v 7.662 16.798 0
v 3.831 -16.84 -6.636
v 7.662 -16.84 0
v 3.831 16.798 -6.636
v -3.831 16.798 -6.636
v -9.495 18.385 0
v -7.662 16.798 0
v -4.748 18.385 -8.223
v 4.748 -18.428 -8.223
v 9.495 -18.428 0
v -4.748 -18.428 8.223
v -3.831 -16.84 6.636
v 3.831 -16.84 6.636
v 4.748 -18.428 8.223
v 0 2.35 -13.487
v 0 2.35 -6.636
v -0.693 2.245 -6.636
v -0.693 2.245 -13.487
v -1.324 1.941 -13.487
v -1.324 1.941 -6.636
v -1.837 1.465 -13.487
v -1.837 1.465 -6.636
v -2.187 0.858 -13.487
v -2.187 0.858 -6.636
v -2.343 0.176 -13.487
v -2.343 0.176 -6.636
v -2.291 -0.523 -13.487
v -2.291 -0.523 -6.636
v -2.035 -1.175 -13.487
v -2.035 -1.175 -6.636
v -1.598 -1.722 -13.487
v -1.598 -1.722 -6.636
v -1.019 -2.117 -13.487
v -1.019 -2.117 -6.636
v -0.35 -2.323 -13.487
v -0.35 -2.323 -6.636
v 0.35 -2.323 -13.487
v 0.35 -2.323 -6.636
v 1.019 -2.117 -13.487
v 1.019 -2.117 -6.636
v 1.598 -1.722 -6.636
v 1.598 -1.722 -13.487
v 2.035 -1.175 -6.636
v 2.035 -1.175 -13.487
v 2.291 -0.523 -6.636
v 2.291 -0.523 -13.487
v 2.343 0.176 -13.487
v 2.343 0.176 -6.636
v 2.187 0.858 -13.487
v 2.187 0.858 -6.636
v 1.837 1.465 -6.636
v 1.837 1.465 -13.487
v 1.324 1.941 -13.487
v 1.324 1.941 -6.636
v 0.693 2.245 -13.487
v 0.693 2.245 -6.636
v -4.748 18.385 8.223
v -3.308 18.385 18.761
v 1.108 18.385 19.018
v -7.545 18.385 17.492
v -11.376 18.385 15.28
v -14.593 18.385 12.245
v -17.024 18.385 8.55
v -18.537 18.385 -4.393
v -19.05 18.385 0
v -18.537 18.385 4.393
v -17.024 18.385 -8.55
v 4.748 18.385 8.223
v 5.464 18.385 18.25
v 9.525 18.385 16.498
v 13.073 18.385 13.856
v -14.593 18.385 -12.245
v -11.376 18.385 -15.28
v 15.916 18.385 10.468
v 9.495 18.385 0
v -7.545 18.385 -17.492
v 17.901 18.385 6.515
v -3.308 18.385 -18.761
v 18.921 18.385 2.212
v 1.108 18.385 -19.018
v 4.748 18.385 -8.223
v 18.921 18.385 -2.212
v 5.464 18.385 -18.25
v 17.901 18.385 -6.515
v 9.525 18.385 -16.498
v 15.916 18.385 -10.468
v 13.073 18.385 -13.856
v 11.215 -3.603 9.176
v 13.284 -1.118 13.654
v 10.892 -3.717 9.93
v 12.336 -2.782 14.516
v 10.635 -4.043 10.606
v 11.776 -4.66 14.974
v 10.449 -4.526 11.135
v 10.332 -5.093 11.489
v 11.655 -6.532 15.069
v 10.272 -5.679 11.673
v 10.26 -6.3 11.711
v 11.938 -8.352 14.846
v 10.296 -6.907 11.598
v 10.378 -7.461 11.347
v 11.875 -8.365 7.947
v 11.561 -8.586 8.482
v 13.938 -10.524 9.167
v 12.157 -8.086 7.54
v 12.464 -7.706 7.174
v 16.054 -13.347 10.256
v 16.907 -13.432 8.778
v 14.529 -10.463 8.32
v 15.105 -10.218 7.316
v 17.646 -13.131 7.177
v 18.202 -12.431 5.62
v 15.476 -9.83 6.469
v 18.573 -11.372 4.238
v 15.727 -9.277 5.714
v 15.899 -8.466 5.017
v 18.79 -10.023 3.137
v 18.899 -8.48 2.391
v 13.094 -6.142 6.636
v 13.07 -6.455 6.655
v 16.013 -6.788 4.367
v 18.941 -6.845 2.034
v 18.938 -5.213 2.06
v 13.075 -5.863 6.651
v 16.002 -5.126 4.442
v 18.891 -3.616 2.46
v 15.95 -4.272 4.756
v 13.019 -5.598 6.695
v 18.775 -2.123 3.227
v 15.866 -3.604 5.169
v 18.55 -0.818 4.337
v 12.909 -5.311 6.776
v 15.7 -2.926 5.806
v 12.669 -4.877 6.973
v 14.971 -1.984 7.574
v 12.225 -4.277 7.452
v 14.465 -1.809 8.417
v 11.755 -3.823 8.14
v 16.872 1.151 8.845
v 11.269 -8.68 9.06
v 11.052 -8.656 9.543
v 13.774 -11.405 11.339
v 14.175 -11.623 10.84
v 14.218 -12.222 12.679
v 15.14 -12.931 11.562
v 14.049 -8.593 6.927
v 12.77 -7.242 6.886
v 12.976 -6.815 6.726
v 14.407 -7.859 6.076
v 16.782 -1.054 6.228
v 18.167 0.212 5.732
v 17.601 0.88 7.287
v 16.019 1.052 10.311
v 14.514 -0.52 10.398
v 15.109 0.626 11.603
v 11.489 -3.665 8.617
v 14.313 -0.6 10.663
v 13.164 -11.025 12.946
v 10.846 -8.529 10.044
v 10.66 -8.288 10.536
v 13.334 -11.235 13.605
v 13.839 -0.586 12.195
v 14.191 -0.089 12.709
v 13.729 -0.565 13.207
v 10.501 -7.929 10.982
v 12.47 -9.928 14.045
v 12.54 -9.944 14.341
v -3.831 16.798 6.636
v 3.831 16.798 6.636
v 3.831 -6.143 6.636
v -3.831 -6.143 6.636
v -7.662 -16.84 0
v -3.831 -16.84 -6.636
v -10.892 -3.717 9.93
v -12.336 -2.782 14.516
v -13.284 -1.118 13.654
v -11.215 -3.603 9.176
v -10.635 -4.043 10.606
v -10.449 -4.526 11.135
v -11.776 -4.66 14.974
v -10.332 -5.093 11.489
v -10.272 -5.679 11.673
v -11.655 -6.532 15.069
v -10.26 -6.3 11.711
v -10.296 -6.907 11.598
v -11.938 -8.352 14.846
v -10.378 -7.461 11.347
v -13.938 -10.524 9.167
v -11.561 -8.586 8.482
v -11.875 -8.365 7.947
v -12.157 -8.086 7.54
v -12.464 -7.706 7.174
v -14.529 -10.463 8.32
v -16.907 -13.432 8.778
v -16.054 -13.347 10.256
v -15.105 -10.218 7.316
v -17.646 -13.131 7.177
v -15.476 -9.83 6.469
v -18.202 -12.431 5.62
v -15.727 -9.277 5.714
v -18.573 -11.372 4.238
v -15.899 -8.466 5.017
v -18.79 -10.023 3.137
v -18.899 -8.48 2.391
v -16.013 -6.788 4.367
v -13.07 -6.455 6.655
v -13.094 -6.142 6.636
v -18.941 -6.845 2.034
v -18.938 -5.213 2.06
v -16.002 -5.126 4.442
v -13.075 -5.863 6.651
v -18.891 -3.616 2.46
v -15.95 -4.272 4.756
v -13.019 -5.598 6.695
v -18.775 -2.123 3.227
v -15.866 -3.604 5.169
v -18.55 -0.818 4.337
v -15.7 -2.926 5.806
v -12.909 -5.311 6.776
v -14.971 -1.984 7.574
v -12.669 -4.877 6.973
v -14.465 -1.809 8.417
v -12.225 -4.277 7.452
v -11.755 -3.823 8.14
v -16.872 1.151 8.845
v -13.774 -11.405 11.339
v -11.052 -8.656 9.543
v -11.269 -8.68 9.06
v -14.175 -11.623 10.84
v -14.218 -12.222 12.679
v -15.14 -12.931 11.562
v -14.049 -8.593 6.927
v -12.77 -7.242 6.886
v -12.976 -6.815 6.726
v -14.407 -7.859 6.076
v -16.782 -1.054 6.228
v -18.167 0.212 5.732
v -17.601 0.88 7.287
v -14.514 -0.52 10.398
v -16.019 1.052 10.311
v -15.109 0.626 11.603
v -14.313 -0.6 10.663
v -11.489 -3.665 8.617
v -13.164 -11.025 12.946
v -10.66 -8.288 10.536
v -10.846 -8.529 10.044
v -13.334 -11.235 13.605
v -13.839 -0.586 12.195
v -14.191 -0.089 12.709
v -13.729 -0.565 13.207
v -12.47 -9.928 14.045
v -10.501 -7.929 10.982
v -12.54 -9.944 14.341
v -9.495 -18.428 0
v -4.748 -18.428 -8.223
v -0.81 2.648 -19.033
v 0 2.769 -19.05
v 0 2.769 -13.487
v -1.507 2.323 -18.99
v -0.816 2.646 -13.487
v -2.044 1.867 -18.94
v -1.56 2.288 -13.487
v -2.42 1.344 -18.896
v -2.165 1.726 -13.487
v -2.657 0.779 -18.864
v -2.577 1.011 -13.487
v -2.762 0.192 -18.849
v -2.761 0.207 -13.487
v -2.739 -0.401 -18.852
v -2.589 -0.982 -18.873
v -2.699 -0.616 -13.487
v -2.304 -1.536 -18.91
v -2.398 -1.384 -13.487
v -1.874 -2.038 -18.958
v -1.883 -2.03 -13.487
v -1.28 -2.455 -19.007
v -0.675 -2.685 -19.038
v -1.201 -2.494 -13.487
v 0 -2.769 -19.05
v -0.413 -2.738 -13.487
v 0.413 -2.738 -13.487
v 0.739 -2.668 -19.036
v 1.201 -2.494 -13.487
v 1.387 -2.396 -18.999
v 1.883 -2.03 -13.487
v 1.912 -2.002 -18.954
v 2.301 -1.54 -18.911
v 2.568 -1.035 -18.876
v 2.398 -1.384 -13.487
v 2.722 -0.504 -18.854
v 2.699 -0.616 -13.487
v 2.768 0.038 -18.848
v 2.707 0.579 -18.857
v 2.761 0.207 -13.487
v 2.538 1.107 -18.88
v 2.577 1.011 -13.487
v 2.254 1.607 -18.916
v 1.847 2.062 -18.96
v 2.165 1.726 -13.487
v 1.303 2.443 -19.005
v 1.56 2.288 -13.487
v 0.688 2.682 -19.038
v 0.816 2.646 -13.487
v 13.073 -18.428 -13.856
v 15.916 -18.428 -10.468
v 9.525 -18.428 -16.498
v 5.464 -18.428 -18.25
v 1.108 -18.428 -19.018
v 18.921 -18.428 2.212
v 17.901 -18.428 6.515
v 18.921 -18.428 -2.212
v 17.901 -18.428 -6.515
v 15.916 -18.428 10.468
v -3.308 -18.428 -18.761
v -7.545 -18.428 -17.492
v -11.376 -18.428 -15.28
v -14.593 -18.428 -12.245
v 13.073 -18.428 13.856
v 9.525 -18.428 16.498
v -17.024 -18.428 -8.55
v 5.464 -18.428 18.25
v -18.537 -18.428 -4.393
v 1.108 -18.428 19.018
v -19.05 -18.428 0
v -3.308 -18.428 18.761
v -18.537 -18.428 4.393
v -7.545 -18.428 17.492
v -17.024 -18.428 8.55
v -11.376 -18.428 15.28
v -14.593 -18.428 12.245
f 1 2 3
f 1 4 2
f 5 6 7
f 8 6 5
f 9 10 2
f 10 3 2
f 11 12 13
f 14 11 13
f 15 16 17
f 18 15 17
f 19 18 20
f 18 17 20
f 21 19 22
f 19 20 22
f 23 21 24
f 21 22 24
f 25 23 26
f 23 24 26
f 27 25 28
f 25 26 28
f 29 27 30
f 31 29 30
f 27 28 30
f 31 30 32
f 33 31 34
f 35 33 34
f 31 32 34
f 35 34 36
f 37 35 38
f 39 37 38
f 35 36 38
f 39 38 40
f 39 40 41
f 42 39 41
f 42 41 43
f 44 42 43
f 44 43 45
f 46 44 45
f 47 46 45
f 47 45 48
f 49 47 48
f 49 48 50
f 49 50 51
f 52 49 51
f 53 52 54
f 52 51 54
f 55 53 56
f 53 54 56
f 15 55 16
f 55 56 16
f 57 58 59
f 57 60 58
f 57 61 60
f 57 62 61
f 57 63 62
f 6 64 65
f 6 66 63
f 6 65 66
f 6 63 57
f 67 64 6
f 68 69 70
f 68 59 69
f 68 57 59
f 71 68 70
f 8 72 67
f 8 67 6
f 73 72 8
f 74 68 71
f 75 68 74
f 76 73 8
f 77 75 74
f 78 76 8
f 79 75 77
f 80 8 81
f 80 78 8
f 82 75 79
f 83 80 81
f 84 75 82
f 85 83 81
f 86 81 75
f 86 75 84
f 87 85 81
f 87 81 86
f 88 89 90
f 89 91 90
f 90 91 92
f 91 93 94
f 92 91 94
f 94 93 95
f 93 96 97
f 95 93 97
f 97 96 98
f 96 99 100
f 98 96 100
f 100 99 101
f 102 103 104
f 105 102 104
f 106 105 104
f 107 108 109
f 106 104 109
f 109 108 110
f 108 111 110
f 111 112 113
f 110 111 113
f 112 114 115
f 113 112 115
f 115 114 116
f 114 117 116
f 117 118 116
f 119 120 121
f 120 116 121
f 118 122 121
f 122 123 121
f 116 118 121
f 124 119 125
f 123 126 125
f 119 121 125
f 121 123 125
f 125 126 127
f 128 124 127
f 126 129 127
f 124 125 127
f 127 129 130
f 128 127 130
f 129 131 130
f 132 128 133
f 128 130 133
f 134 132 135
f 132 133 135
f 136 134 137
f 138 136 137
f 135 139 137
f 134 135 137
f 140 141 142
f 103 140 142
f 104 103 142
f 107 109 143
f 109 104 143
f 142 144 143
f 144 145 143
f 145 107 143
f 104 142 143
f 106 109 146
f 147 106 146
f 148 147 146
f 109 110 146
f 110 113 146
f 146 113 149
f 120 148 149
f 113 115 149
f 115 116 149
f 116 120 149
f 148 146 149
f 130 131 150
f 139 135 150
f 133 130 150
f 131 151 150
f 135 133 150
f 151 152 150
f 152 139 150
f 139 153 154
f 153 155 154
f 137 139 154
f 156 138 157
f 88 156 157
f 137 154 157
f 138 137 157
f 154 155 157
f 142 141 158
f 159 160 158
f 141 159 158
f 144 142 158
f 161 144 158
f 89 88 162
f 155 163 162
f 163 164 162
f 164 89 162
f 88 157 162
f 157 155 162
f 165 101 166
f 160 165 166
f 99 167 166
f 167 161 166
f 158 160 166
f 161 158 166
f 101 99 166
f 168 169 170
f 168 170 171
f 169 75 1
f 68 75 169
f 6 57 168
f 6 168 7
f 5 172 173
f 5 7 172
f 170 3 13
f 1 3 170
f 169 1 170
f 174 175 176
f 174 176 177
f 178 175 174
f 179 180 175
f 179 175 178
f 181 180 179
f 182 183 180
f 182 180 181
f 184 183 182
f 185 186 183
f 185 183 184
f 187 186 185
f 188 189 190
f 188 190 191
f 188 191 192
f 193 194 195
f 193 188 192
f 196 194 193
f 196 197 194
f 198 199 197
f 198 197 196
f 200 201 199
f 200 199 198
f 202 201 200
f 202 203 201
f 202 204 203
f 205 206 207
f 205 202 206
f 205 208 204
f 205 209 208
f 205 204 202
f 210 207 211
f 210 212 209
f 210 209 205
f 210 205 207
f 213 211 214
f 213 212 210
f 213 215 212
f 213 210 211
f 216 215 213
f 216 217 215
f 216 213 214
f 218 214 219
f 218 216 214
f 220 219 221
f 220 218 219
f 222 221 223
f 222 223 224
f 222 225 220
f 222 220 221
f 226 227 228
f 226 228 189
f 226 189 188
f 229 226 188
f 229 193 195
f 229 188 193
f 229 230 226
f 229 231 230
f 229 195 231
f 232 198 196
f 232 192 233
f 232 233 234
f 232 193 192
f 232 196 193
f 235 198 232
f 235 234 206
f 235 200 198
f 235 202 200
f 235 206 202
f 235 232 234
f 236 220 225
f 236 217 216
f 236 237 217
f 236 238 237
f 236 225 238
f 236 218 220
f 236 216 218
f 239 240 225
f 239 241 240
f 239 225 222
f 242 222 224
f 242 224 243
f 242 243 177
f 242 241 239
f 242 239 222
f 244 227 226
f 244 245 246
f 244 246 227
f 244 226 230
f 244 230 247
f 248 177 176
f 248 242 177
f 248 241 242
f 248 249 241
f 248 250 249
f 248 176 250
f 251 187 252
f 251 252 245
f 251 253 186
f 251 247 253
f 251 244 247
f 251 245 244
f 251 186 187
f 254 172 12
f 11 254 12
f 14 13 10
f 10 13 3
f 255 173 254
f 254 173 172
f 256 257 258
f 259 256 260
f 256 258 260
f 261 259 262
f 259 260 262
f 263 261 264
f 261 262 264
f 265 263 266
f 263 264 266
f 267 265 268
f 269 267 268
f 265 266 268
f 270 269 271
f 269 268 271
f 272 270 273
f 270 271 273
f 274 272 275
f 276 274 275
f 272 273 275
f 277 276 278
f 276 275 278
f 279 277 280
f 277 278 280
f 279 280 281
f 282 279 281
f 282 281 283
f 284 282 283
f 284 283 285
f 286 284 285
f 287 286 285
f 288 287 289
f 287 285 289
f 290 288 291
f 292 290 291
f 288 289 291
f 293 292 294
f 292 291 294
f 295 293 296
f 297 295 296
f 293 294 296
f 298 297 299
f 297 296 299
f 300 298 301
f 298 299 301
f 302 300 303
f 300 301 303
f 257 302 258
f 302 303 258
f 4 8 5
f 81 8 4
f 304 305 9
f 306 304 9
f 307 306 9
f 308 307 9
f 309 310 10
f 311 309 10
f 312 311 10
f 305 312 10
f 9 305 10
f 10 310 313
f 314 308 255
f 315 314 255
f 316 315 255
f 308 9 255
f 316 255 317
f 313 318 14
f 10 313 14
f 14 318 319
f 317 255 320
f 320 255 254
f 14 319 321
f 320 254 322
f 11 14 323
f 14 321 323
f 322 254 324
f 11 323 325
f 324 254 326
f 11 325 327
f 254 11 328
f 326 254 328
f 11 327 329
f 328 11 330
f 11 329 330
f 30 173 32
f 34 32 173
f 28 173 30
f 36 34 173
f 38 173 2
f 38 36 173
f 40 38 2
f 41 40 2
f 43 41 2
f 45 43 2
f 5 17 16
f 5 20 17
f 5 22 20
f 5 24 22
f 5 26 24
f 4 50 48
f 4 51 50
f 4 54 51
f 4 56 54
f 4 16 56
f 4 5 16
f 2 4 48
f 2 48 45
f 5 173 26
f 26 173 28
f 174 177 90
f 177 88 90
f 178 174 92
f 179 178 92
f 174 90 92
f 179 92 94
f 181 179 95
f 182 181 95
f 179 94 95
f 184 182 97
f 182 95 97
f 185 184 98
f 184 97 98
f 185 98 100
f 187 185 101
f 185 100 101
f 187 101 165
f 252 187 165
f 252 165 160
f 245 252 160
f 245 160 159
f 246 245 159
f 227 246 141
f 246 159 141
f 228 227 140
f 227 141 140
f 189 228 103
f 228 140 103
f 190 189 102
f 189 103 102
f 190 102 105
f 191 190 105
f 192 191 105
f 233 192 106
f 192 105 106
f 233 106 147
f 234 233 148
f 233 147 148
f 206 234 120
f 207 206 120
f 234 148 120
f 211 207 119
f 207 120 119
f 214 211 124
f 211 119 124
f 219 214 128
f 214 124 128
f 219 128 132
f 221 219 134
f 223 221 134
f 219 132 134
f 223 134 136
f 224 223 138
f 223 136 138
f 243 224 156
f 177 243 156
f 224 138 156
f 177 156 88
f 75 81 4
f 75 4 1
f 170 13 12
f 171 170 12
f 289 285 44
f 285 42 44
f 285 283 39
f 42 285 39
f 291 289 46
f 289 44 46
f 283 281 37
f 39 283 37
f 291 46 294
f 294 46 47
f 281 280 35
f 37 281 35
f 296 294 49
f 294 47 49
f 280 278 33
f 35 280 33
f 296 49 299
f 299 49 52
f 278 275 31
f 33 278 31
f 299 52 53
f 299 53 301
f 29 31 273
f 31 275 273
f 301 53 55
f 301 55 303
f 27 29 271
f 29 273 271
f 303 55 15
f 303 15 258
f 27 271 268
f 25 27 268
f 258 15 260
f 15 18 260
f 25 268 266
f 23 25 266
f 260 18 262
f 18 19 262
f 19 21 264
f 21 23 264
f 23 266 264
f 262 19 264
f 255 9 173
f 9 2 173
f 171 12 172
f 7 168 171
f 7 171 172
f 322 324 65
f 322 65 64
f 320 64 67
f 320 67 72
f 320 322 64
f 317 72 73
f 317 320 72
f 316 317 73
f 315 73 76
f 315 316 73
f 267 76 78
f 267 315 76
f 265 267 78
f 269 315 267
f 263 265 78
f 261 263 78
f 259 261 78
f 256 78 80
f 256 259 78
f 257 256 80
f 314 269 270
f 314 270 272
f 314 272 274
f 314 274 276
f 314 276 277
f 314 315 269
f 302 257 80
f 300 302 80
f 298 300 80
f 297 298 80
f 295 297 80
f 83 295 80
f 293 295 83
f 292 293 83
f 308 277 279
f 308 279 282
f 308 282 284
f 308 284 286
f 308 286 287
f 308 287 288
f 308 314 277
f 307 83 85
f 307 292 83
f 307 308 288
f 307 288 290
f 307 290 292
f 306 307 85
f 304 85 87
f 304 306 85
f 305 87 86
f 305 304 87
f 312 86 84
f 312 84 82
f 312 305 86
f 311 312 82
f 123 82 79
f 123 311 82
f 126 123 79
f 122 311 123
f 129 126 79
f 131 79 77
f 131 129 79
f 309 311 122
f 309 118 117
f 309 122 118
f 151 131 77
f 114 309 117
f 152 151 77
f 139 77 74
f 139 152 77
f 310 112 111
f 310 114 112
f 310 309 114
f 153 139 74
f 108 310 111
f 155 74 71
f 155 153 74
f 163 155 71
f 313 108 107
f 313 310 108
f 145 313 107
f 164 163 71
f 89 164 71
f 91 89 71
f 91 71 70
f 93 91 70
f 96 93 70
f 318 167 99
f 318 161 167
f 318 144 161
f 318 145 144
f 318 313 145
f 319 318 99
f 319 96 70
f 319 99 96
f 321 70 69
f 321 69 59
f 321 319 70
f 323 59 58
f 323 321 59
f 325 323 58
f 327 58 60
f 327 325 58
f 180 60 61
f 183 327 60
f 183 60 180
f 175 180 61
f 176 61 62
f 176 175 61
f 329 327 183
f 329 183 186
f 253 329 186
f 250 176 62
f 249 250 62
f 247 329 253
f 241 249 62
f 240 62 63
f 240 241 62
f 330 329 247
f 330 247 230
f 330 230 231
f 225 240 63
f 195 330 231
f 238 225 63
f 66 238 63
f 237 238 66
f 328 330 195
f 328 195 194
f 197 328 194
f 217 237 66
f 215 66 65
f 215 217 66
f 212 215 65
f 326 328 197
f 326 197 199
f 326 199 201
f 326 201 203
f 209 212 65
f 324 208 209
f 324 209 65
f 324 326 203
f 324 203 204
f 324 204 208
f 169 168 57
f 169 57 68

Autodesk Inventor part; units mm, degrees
ref_plane "YZ Plane" through (0, 0, 0) normal (1, 0, 0) x (0, 1, 0)
ref_plane "XZ Plane" through (0, 0, 0) normal (0, 1, 0) x (-1, 0, 0)
sketch "Sketch9" plane through (0, 0, 0) normal (0, 1, 0) x (-1, 0, 0)
  circle A0 centre (0, 0) radius 19.05
  dimension "d53" = 38.1
extrude "Extrusion6" add sketch "Sketch9" along normal mid plane 36.8554
sketch "Sketch10" plane through (0, 18.4277, 0) normal (0, 1, 0) x (1, 0, 0)
  circle A0 centre (0, 0) radius 13.589
  dimension "idWasher" = 27.178
extrude "Extrusion7" add sketch "Sketch10" along normal blind 2.3707
sketch "Sketch11" plane through (0, 20.7984, 0) normal (0, 1, 0) x (1, 0, 0)
  line L0 (7.6623, 0) -> (3.8312, -6.6358)
  line L1 (3.8312, -6.6358) -> (-3.8312, -6.6358)
  line L2 (-3.8312, -6.6358) -> (-7.6623, 0)
  line L3 (-7.6623, 0) -> (-3.8312, 6.6357)
  line L4 (-3.8312, 6.6357) -> (3.8312, 6.6357)
  line L5 (3.8312, 6.6357) -> (7.6623, 0)
  point P0 (0, 0)
  point P1 (0, 0)
  dimension "d59" = 13.2715
extrude "Extrusion8" cut sketch "Sketch11" against normal through all
sketch "Sketch12" plane through (0, 0, 0) normal (1, 0, 0) x (0, 1, 0)
  circle A0 centre (-6.1426, 9.1758) radius 2.54
  line L0 (20.7984, 0) -> (-18.4277, 0) projected
  line L1 (-18.4277, 19.05) -> (-18.4277, -19.05) projected
  point P0 (0, 0)
  dimension "d62" = 5.08
  dimension "d63" = 9.1758
  dimension "oneThirdSpoolHeight" = 12.2851
extrude "Extrusion9" cut sketch "Sketch12" along normal through all both and the other way through all
chamfer "Chamfer5" distance 4.7625 angle 45 2 edges at (16.6229, -8.6793, 9.3048) (-16.6229, -8.6793, 9.3048)
ref_plane "Work Plane2" through (0, 0, -19.05) normal (0, 0, 1) x (1, 0, 0)
sketch "Sketch13" plane through (0, 0, -19.05) normal (0, 0, 1) x (1, 0, 0)
  point P0 (0, 0)
  point P1 (0, 0)
hole "Hole2" at (0, 0, -19.05) direction (0, 0, 1) diameter 4.699 depth 12.4143 counterbore diameter 5.5372 counterbore depth 5.5626
chamfer "Chamfer6" distance 1.5875 angle 45 12 edges at (-5.7467, 20.7984, -3.3179) (0, 20.7984, -6.6357) (5.7467, 20.7984, -3.3179) (5.7467, 20.7984, 3.3179) (0, 20.7984, 6.6358) (-5.7467, 20.7984, 3.3179) (0, -18.4277, 6.6358) (5.7467, -18.4277, 3.3179) (5.7467, -18.4277, -3.3179) (0, -18.4277, -6.6357) (-5.7467, -18.4277, -3.3179) (-5.7467, -18.4277, 3.3179)
sketch "Sketch14" plane through (0, 20.7984, 0) normal (0, 1, 0) x (1, 0, 0)
  circle A0 centre (0, 0) radius 19.05
extrude "Extrusion10" cut sketch "Sketch14" against normal blind 2.413
chamfer "Chamfer7" distance 1.5875 angle 45 6 edges at (-5.7467, 18.3854, -3.3179) (0, 18.3854, -6.6357) (5.7467, 18.3854, -3.3179) (5.7467, 18.3854, 3.3179) (0, 18.3854, 6.6358) (-5.7467, 18.3854, 3.3179)
equation "\"d53\" = spoolInteriorDiameter"
equation "\"d59\" = hexDiameter"
equation "\"d62\" = holeForString"
equation "\"d63\" = stringHoleCenterFromHexShaft"
equation "\"oneThirdSpoolHeight\" = 0.333333 * singleSpoolHeight"
equation "\"d67\" = stringHoleChamfer"
equation "\"d77\" = hexHoleChamfer"
equation "\"d82\" = hexHoleChamfer"
equation "\"holeForString\" = stringDiameter + clearanceForString"
equation "\"stringDiameter\" = 3.048"
equation "\"clearanceForString\" = 2.032"
equation "\"spoolHeightWithoutSpacer\" = 69.85"
equation "\"hexShaftDiameter\" = 12.7"
equation "\"clearanceForHexShaft\" = 0.5715"
equation "\"hexDiameter\" = hexShaftDiameter + clearanceForHexShaft"
equation "\"supportChannels\" = 3.81"
equation "\"spoolInteriorDiameter\" = 38.1"
equation "\"spoolInteriroRadius\" = 0.5 * spoolInteriorDiameter"
equation "\"spoolExteriorDiameter\" = 88.9"
equation "\"spoolExteriorRadius\" = 0.5 * spoolExteriorDiameter"
equation "\"spoolFiletRadius\" = 0.5 * supportChannels"
equation "\"holeCenter\" = 0.25 * spoolHeightWithoutSpacer - 0.75 * supportChannels"
equation "\"hexHoleChamfer\" = 1.5875"
equation "\"stringHoleCenterFromHexShaft\" = 0.5 * hexDiameter + 0.5 * holeForString"
equation "\"textCircleDiameter\" = 0.75 * spoolExteriorDiameter"
equation "\"textHeight\" = 6.096"
equation "\"textDepth\" = 1.27"
equation "\"stringHoleChamfer\" = 4.7625"
equation "\"spoolTotalHeight\" = 76.2"
equation "\"spaceHeight\" = spoolTotalHeight - spoolHeightWithoutSpacer"
equation "\"spacerDiameter\" = 24.13"
equation "\"singleSpoolHeight\" = 36.8554"
properties part number "spoolV05" material "PC/ABS Plastic"
